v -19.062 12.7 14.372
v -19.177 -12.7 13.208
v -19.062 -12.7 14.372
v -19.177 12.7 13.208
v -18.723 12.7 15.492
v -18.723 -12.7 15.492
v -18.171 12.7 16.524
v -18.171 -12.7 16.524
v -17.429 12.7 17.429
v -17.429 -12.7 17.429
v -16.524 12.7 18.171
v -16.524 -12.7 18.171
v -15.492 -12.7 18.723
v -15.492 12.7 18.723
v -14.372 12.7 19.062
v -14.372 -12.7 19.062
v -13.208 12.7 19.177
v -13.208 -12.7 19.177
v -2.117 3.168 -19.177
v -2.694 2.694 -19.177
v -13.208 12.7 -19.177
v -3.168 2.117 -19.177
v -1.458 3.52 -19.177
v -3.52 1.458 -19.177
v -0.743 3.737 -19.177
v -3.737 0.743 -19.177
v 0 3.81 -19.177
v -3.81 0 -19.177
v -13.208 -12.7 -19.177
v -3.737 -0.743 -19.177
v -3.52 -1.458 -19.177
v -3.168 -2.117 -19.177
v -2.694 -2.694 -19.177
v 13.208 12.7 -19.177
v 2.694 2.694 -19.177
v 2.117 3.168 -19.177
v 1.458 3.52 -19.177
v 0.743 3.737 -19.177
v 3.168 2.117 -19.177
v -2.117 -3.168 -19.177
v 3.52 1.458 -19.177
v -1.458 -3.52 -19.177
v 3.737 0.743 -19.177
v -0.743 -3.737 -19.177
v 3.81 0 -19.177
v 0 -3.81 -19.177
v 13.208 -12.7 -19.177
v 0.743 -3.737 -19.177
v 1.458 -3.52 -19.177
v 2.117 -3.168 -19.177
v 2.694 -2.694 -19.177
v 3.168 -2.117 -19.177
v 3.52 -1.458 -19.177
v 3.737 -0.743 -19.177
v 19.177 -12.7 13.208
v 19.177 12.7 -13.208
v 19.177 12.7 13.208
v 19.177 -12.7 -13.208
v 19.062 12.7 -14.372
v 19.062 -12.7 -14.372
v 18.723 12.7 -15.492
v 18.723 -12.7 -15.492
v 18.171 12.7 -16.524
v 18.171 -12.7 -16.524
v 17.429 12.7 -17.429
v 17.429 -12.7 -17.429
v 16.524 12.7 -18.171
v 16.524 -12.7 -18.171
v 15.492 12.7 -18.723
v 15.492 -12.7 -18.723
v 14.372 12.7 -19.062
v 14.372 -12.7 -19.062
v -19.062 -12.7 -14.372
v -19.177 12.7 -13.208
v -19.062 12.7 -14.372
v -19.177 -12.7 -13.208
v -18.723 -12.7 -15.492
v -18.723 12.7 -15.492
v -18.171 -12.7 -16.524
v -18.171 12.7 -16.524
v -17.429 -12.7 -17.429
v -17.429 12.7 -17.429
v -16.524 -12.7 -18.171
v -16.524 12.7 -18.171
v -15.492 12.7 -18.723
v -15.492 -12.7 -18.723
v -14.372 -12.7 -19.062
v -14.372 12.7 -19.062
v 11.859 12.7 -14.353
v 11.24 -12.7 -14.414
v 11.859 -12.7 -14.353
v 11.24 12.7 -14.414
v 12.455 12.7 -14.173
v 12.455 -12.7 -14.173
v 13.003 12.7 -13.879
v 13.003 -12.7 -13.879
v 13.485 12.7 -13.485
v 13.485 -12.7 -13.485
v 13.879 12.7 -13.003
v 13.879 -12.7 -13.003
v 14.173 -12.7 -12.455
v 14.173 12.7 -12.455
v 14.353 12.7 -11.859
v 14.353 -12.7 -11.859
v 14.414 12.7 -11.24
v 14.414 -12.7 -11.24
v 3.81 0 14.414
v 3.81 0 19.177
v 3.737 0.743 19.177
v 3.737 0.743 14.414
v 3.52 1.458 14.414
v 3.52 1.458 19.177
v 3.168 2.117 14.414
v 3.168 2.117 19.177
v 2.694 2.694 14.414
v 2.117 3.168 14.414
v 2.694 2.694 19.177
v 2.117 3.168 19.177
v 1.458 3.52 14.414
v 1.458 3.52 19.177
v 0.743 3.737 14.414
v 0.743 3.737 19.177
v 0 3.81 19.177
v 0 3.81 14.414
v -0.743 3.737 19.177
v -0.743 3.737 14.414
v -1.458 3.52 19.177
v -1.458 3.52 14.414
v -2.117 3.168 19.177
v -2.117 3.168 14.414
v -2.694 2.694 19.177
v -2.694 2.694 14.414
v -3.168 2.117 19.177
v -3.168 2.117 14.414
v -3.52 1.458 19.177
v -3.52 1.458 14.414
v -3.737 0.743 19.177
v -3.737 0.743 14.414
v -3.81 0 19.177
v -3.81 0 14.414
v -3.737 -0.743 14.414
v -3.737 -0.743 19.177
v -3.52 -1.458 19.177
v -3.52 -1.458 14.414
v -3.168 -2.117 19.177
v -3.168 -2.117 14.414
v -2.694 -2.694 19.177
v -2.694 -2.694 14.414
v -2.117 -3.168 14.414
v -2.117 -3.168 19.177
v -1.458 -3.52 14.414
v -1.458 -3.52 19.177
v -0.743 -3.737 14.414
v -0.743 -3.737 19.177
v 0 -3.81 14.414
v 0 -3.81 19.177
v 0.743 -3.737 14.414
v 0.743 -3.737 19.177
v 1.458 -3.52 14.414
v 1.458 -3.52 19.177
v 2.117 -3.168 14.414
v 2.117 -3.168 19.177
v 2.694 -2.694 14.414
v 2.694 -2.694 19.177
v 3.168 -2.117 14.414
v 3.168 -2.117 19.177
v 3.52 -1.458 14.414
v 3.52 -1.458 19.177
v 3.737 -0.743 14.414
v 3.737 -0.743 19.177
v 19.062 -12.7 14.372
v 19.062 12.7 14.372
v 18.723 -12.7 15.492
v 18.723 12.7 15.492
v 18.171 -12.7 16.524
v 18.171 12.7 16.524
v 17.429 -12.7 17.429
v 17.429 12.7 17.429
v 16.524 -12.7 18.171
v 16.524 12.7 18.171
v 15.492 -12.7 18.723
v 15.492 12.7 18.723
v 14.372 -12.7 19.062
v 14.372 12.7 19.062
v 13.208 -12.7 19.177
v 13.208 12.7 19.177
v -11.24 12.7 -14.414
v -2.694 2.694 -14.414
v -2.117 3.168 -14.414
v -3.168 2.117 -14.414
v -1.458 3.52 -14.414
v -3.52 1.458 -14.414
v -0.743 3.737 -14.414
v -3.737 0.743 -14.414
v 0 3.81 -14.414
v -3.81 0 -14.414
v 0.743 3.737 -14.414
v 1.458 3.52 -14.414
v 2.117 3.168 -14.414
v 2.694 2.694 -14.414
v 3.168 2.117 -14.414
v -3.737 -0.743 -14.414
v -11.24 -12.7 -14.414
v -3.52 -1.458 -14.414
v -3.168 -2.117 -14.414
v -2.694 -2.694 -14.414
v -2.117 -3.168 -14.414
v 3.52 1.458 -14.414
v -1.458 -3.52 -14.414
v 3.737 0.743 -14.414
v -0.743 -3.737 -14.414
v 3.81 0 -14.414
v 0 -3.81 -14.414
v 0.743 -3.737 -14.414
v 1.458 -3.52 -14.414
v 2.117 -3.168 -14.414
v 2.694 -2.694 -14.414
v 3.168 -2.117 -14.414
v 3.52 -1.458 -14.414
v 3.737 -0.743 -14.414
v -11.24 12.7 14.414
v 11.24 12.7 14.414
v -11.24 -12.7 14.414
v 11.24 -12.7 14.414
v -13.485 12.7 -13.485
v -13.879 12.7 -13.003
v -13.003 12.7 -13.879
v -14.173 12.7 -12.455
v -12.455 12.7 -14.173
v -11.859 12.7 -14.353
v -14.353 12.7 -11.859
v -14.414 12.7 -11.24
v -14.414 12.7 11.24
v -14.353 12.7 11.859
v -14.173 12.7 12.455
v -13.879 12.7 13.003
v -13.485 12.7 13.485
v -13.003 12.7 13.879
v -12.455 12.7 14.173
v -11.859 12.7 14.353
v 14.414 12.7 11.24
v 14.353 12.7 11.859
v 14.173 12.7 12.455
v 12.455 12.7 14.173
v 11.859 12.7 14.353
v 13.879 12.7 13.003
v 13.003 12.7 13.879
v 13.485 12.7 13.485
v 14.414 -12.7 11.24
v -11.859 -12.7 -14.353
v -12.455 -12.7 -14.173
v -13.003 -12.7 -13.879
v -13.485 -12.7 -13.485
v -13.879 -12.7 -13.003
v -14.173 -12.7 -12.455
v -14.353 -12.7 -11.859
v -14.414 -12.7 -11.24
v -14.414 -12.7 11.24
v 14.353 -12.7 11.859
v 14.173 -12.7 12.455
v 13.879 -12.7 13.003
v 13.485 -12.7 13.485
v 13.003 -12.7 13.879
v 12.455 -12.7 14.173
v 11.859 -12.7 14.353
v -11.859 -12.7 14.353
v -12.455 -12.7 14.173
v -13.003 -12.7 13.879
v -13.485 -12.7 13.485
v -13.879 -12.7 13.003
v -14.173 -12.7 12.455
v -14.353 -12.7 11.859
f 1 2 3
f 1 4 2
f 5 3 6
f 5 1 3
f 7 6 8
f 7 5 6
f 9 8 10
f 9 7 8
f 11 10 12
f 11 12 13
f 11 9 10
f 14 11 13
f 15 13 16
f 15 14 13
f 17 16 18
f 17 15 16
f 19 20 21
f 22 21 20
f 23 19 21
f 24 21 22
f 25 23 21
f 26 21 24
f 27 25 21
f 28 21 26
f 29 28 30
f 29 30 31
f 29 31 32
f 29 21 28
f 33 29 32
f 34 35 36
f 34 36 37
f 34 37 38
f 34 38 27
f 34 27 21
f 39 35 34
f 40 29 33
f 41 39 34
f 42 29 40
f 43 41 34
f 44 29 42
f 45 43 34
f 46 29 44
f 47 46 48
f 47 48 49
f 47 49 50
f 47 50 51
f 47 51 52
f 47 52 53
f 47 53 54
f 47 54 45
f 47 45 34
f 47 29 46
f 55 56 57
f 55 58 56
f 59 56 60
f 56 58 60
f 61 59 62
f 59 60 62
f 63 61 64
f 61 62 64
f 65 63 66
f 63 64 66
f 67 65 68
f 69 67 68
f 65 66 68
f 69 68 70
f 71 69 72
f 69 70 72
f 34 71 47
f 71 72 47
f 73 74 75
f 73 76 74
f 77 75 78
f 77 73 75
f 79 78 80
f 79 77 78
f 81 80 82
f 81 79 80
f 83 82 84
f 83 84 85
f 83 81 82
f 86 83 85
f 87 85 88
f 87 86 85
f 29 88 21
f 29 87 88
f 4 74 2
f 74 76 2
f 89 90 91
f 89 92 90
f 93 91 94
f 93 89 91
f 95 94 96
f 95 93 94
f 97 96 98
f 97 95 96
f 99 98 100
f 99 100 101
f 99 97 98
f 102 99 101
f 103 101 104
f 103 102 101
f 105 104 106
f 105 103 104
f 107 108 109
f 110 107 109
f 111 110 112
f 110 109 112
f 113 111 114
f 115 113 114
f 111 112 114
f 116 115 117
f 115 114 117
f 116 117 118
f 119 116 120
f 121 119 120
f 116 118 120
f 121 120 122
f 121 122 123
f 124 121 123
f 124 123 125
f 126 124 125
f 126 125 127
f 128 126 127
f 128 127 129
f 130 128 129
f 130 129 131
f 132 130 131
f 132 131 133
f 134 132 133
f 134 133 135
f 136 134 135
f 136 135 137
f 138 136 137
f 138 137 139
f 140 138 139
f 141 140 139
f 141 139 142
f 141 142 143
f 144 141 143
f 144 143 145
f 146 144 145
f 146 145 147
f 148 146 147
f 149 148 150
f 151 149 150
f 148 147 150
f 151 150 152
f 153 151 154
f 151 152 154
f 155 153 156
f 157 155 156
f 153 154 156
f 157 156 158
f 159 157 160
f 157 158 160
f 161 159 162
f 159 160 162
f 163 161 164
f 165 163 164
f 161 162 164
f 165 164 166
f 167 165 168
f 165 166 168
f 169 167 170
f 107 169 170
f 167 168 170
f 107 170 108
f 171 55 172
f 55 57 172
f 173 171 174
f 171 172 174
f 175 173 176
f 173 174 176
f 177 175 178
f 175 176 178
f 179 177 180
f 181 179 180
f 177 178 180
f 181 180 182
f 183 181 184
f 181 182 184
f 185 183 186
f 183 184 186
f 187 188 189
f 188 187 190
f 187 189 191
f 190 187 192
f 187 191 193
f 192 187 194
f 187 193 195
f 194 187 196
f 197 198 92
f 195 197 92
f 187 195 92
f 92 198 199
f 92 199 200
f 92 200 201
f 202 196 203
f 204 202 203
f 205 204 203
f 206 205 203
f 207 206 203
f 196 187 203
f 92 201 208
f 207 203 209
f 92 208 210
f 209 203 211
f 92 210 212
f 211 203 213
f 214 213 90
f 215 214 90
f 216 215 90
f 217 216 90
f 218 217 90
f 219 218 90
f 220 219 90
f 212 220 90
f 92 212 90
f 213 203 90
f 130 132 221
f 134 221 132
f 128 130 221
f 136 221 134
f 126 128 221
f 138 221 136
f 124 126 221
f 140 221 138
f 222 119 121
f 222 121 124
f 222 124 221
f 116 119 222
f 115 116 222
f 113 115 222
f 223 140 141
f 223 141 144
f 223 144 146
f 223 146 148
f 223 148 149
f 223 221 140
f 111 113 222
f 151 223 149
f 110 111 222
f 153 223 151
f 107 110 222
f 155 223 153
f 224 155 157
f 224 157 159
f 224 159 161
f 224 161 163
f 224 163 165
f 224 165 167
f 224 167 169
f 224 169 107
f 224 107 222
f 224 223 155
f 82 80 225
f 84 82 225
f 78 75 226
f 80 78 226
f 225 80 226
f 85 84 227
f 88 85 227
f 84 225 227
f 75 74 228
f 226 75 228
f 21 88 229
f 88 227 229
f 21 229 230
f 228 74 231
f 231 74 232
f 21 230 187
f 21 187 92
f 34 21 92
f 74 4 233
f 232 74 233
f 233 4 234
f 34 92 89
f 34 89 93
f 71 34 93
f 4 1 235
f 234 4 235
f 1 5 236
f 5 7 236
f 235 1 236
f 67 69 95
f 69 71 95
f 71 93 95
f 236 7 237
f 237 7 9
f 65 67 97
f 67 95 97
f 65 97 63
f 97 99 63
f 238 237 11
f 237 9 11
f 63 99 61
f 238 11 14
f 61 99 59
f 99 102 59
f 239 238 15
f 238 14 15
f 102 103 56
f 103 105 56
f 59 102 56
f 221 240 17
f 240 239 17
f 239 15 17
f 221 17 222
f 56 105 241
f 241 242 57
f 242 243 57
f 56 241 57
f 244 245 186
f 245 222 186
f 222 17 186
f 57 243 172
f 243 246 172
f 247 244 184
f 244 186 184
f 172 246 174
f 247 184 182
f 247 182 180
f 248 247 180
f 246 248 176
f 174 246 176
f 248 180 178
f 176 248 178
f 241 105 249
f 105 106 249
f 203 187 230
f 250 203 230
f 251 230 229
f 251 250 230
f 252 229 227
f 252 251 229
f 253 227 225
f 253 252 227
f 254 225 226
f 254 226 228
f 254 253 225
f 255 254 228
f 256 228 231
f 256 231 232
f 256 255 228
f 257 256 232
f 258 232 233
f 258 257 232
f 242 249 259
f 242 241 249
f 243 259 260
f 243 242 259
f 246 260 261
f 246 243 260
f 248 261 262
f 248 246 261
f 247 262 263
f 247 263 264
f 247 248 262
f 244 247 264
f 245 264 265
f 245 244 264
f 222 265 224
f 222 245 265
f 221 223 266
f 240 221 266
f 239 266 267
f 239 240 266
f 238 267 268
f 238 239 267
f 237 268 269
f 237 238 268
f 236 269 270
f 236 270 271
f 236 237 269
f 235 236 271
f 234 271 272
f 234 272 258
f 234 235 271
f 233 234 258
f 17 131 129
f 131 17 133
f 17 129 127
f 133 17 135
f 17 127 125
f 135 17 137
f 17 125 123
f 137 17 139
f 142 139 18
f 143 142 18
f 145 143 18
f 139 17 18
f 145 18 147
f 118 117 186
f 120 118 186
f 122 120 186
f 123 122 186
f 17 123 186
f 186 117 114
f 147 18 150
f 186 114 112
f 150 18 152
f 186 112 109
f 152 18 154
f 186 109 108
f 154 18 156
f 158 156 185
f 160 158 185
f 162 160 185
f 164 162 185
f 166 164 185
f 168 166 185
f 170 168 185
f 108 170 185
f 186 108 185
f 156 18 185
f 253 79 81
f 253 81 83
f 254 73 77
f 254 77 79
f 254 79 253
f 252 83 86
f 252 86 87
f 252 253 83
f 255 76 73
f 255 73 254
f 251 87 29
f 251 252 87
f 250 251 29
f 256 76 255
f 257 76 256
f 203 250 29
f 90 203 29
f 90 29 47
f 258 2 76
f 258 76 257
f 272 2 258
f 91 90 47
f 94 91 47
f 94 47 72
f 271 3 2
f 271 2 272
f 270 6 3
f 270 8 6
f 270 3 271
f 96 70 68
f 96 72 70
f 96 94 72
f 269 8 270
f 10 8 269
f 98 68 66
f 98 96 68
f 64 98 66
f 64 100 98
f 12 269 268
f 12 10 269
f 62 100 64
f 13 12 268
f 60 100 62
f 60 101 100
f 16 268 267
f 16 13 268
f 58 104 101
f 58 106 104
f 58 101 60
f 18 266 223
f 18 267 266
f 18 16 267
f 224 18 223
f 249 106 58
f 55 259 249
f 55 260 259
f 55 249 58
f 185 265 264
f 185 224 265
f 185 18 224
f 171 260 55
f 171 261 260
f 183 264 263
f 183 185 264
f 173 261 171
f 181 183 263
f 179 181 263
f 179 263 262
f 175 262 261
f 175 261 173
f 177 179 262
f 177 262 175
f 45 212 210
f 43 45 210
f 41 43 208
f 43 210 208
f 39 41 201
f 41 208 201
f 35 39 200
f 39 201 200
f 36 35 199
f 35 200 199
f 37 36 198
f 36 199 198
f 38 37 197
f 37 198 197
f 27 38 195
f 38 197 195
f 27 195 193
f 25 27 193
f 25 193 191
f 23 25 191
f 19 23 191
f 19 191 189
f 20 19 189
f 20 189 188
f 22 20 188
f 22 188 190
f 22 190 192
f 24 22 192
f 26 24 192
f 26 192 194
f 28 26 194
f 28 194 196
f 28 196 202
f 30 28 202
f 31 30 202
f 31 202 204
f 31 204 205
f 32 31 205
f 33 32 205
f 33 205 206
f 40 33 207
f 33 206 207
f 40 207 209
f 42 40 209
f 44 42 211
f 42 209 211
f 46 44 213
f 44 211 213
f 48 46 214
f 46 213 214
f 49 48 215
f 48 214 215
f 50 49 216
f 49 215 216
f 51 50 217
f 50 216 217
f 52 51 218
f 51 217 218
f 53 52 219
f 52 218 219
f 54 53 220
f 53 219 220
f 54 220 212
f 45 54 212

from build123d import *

# Parameters (mm, degrees)
F0_W     = 38.354
F0_H     = 38.354
F0_W_2   = 28.829
F0_H_2   = 28.829
F1_DEPTH = 12.7
F2_R     = 5.969
F3_R     = 3.175
F4_R     = 3.81
F5_DEPTH = 43.688


with BuildPart() as f1:
    # F0 (on Front) → F1 (new body, symmetric)
    with BuildSketch(Plane.XZ):
        Rectangle(F0_W, F0_H)
        Rectangle(F0_W_2, F0_H_2, mode=Mode.SUBTRACT)
    extrude(amount=F1_DEPTH, both=True)

    # F2
    f2_edges = [f1.edges().sort_by_distance(p)[0] for p in [
        (-19.177, 0, 19.177),
        (19.177, 0, 19.177),
        (19.177, 0, -19.177),
        (-19.177, 0, -19.177),
    ]]
    fillet(f2_edges, radius=F2_R)

    # F3
    f3_edges = [f1.edges().sort_by_distance(p)[0] for p in [
        (-14.4145, 0, 14.4145),
        (14.4145, 0, 14.4145),
        (14.4145, 0, -14.4145),
        (-14.4145, 0, -14.4145),
    ]]
    fillet(f3_edges, radius=F3_R)

    # F4 (on face) → F5 (cut)
    with BuildSketch(Plane.XY.offset(19.177)):
        Circle(F4_R)
    extrude(amount=-F5_DEPTH, mode=Mode.SUBTRACT)


solid = f1.part
